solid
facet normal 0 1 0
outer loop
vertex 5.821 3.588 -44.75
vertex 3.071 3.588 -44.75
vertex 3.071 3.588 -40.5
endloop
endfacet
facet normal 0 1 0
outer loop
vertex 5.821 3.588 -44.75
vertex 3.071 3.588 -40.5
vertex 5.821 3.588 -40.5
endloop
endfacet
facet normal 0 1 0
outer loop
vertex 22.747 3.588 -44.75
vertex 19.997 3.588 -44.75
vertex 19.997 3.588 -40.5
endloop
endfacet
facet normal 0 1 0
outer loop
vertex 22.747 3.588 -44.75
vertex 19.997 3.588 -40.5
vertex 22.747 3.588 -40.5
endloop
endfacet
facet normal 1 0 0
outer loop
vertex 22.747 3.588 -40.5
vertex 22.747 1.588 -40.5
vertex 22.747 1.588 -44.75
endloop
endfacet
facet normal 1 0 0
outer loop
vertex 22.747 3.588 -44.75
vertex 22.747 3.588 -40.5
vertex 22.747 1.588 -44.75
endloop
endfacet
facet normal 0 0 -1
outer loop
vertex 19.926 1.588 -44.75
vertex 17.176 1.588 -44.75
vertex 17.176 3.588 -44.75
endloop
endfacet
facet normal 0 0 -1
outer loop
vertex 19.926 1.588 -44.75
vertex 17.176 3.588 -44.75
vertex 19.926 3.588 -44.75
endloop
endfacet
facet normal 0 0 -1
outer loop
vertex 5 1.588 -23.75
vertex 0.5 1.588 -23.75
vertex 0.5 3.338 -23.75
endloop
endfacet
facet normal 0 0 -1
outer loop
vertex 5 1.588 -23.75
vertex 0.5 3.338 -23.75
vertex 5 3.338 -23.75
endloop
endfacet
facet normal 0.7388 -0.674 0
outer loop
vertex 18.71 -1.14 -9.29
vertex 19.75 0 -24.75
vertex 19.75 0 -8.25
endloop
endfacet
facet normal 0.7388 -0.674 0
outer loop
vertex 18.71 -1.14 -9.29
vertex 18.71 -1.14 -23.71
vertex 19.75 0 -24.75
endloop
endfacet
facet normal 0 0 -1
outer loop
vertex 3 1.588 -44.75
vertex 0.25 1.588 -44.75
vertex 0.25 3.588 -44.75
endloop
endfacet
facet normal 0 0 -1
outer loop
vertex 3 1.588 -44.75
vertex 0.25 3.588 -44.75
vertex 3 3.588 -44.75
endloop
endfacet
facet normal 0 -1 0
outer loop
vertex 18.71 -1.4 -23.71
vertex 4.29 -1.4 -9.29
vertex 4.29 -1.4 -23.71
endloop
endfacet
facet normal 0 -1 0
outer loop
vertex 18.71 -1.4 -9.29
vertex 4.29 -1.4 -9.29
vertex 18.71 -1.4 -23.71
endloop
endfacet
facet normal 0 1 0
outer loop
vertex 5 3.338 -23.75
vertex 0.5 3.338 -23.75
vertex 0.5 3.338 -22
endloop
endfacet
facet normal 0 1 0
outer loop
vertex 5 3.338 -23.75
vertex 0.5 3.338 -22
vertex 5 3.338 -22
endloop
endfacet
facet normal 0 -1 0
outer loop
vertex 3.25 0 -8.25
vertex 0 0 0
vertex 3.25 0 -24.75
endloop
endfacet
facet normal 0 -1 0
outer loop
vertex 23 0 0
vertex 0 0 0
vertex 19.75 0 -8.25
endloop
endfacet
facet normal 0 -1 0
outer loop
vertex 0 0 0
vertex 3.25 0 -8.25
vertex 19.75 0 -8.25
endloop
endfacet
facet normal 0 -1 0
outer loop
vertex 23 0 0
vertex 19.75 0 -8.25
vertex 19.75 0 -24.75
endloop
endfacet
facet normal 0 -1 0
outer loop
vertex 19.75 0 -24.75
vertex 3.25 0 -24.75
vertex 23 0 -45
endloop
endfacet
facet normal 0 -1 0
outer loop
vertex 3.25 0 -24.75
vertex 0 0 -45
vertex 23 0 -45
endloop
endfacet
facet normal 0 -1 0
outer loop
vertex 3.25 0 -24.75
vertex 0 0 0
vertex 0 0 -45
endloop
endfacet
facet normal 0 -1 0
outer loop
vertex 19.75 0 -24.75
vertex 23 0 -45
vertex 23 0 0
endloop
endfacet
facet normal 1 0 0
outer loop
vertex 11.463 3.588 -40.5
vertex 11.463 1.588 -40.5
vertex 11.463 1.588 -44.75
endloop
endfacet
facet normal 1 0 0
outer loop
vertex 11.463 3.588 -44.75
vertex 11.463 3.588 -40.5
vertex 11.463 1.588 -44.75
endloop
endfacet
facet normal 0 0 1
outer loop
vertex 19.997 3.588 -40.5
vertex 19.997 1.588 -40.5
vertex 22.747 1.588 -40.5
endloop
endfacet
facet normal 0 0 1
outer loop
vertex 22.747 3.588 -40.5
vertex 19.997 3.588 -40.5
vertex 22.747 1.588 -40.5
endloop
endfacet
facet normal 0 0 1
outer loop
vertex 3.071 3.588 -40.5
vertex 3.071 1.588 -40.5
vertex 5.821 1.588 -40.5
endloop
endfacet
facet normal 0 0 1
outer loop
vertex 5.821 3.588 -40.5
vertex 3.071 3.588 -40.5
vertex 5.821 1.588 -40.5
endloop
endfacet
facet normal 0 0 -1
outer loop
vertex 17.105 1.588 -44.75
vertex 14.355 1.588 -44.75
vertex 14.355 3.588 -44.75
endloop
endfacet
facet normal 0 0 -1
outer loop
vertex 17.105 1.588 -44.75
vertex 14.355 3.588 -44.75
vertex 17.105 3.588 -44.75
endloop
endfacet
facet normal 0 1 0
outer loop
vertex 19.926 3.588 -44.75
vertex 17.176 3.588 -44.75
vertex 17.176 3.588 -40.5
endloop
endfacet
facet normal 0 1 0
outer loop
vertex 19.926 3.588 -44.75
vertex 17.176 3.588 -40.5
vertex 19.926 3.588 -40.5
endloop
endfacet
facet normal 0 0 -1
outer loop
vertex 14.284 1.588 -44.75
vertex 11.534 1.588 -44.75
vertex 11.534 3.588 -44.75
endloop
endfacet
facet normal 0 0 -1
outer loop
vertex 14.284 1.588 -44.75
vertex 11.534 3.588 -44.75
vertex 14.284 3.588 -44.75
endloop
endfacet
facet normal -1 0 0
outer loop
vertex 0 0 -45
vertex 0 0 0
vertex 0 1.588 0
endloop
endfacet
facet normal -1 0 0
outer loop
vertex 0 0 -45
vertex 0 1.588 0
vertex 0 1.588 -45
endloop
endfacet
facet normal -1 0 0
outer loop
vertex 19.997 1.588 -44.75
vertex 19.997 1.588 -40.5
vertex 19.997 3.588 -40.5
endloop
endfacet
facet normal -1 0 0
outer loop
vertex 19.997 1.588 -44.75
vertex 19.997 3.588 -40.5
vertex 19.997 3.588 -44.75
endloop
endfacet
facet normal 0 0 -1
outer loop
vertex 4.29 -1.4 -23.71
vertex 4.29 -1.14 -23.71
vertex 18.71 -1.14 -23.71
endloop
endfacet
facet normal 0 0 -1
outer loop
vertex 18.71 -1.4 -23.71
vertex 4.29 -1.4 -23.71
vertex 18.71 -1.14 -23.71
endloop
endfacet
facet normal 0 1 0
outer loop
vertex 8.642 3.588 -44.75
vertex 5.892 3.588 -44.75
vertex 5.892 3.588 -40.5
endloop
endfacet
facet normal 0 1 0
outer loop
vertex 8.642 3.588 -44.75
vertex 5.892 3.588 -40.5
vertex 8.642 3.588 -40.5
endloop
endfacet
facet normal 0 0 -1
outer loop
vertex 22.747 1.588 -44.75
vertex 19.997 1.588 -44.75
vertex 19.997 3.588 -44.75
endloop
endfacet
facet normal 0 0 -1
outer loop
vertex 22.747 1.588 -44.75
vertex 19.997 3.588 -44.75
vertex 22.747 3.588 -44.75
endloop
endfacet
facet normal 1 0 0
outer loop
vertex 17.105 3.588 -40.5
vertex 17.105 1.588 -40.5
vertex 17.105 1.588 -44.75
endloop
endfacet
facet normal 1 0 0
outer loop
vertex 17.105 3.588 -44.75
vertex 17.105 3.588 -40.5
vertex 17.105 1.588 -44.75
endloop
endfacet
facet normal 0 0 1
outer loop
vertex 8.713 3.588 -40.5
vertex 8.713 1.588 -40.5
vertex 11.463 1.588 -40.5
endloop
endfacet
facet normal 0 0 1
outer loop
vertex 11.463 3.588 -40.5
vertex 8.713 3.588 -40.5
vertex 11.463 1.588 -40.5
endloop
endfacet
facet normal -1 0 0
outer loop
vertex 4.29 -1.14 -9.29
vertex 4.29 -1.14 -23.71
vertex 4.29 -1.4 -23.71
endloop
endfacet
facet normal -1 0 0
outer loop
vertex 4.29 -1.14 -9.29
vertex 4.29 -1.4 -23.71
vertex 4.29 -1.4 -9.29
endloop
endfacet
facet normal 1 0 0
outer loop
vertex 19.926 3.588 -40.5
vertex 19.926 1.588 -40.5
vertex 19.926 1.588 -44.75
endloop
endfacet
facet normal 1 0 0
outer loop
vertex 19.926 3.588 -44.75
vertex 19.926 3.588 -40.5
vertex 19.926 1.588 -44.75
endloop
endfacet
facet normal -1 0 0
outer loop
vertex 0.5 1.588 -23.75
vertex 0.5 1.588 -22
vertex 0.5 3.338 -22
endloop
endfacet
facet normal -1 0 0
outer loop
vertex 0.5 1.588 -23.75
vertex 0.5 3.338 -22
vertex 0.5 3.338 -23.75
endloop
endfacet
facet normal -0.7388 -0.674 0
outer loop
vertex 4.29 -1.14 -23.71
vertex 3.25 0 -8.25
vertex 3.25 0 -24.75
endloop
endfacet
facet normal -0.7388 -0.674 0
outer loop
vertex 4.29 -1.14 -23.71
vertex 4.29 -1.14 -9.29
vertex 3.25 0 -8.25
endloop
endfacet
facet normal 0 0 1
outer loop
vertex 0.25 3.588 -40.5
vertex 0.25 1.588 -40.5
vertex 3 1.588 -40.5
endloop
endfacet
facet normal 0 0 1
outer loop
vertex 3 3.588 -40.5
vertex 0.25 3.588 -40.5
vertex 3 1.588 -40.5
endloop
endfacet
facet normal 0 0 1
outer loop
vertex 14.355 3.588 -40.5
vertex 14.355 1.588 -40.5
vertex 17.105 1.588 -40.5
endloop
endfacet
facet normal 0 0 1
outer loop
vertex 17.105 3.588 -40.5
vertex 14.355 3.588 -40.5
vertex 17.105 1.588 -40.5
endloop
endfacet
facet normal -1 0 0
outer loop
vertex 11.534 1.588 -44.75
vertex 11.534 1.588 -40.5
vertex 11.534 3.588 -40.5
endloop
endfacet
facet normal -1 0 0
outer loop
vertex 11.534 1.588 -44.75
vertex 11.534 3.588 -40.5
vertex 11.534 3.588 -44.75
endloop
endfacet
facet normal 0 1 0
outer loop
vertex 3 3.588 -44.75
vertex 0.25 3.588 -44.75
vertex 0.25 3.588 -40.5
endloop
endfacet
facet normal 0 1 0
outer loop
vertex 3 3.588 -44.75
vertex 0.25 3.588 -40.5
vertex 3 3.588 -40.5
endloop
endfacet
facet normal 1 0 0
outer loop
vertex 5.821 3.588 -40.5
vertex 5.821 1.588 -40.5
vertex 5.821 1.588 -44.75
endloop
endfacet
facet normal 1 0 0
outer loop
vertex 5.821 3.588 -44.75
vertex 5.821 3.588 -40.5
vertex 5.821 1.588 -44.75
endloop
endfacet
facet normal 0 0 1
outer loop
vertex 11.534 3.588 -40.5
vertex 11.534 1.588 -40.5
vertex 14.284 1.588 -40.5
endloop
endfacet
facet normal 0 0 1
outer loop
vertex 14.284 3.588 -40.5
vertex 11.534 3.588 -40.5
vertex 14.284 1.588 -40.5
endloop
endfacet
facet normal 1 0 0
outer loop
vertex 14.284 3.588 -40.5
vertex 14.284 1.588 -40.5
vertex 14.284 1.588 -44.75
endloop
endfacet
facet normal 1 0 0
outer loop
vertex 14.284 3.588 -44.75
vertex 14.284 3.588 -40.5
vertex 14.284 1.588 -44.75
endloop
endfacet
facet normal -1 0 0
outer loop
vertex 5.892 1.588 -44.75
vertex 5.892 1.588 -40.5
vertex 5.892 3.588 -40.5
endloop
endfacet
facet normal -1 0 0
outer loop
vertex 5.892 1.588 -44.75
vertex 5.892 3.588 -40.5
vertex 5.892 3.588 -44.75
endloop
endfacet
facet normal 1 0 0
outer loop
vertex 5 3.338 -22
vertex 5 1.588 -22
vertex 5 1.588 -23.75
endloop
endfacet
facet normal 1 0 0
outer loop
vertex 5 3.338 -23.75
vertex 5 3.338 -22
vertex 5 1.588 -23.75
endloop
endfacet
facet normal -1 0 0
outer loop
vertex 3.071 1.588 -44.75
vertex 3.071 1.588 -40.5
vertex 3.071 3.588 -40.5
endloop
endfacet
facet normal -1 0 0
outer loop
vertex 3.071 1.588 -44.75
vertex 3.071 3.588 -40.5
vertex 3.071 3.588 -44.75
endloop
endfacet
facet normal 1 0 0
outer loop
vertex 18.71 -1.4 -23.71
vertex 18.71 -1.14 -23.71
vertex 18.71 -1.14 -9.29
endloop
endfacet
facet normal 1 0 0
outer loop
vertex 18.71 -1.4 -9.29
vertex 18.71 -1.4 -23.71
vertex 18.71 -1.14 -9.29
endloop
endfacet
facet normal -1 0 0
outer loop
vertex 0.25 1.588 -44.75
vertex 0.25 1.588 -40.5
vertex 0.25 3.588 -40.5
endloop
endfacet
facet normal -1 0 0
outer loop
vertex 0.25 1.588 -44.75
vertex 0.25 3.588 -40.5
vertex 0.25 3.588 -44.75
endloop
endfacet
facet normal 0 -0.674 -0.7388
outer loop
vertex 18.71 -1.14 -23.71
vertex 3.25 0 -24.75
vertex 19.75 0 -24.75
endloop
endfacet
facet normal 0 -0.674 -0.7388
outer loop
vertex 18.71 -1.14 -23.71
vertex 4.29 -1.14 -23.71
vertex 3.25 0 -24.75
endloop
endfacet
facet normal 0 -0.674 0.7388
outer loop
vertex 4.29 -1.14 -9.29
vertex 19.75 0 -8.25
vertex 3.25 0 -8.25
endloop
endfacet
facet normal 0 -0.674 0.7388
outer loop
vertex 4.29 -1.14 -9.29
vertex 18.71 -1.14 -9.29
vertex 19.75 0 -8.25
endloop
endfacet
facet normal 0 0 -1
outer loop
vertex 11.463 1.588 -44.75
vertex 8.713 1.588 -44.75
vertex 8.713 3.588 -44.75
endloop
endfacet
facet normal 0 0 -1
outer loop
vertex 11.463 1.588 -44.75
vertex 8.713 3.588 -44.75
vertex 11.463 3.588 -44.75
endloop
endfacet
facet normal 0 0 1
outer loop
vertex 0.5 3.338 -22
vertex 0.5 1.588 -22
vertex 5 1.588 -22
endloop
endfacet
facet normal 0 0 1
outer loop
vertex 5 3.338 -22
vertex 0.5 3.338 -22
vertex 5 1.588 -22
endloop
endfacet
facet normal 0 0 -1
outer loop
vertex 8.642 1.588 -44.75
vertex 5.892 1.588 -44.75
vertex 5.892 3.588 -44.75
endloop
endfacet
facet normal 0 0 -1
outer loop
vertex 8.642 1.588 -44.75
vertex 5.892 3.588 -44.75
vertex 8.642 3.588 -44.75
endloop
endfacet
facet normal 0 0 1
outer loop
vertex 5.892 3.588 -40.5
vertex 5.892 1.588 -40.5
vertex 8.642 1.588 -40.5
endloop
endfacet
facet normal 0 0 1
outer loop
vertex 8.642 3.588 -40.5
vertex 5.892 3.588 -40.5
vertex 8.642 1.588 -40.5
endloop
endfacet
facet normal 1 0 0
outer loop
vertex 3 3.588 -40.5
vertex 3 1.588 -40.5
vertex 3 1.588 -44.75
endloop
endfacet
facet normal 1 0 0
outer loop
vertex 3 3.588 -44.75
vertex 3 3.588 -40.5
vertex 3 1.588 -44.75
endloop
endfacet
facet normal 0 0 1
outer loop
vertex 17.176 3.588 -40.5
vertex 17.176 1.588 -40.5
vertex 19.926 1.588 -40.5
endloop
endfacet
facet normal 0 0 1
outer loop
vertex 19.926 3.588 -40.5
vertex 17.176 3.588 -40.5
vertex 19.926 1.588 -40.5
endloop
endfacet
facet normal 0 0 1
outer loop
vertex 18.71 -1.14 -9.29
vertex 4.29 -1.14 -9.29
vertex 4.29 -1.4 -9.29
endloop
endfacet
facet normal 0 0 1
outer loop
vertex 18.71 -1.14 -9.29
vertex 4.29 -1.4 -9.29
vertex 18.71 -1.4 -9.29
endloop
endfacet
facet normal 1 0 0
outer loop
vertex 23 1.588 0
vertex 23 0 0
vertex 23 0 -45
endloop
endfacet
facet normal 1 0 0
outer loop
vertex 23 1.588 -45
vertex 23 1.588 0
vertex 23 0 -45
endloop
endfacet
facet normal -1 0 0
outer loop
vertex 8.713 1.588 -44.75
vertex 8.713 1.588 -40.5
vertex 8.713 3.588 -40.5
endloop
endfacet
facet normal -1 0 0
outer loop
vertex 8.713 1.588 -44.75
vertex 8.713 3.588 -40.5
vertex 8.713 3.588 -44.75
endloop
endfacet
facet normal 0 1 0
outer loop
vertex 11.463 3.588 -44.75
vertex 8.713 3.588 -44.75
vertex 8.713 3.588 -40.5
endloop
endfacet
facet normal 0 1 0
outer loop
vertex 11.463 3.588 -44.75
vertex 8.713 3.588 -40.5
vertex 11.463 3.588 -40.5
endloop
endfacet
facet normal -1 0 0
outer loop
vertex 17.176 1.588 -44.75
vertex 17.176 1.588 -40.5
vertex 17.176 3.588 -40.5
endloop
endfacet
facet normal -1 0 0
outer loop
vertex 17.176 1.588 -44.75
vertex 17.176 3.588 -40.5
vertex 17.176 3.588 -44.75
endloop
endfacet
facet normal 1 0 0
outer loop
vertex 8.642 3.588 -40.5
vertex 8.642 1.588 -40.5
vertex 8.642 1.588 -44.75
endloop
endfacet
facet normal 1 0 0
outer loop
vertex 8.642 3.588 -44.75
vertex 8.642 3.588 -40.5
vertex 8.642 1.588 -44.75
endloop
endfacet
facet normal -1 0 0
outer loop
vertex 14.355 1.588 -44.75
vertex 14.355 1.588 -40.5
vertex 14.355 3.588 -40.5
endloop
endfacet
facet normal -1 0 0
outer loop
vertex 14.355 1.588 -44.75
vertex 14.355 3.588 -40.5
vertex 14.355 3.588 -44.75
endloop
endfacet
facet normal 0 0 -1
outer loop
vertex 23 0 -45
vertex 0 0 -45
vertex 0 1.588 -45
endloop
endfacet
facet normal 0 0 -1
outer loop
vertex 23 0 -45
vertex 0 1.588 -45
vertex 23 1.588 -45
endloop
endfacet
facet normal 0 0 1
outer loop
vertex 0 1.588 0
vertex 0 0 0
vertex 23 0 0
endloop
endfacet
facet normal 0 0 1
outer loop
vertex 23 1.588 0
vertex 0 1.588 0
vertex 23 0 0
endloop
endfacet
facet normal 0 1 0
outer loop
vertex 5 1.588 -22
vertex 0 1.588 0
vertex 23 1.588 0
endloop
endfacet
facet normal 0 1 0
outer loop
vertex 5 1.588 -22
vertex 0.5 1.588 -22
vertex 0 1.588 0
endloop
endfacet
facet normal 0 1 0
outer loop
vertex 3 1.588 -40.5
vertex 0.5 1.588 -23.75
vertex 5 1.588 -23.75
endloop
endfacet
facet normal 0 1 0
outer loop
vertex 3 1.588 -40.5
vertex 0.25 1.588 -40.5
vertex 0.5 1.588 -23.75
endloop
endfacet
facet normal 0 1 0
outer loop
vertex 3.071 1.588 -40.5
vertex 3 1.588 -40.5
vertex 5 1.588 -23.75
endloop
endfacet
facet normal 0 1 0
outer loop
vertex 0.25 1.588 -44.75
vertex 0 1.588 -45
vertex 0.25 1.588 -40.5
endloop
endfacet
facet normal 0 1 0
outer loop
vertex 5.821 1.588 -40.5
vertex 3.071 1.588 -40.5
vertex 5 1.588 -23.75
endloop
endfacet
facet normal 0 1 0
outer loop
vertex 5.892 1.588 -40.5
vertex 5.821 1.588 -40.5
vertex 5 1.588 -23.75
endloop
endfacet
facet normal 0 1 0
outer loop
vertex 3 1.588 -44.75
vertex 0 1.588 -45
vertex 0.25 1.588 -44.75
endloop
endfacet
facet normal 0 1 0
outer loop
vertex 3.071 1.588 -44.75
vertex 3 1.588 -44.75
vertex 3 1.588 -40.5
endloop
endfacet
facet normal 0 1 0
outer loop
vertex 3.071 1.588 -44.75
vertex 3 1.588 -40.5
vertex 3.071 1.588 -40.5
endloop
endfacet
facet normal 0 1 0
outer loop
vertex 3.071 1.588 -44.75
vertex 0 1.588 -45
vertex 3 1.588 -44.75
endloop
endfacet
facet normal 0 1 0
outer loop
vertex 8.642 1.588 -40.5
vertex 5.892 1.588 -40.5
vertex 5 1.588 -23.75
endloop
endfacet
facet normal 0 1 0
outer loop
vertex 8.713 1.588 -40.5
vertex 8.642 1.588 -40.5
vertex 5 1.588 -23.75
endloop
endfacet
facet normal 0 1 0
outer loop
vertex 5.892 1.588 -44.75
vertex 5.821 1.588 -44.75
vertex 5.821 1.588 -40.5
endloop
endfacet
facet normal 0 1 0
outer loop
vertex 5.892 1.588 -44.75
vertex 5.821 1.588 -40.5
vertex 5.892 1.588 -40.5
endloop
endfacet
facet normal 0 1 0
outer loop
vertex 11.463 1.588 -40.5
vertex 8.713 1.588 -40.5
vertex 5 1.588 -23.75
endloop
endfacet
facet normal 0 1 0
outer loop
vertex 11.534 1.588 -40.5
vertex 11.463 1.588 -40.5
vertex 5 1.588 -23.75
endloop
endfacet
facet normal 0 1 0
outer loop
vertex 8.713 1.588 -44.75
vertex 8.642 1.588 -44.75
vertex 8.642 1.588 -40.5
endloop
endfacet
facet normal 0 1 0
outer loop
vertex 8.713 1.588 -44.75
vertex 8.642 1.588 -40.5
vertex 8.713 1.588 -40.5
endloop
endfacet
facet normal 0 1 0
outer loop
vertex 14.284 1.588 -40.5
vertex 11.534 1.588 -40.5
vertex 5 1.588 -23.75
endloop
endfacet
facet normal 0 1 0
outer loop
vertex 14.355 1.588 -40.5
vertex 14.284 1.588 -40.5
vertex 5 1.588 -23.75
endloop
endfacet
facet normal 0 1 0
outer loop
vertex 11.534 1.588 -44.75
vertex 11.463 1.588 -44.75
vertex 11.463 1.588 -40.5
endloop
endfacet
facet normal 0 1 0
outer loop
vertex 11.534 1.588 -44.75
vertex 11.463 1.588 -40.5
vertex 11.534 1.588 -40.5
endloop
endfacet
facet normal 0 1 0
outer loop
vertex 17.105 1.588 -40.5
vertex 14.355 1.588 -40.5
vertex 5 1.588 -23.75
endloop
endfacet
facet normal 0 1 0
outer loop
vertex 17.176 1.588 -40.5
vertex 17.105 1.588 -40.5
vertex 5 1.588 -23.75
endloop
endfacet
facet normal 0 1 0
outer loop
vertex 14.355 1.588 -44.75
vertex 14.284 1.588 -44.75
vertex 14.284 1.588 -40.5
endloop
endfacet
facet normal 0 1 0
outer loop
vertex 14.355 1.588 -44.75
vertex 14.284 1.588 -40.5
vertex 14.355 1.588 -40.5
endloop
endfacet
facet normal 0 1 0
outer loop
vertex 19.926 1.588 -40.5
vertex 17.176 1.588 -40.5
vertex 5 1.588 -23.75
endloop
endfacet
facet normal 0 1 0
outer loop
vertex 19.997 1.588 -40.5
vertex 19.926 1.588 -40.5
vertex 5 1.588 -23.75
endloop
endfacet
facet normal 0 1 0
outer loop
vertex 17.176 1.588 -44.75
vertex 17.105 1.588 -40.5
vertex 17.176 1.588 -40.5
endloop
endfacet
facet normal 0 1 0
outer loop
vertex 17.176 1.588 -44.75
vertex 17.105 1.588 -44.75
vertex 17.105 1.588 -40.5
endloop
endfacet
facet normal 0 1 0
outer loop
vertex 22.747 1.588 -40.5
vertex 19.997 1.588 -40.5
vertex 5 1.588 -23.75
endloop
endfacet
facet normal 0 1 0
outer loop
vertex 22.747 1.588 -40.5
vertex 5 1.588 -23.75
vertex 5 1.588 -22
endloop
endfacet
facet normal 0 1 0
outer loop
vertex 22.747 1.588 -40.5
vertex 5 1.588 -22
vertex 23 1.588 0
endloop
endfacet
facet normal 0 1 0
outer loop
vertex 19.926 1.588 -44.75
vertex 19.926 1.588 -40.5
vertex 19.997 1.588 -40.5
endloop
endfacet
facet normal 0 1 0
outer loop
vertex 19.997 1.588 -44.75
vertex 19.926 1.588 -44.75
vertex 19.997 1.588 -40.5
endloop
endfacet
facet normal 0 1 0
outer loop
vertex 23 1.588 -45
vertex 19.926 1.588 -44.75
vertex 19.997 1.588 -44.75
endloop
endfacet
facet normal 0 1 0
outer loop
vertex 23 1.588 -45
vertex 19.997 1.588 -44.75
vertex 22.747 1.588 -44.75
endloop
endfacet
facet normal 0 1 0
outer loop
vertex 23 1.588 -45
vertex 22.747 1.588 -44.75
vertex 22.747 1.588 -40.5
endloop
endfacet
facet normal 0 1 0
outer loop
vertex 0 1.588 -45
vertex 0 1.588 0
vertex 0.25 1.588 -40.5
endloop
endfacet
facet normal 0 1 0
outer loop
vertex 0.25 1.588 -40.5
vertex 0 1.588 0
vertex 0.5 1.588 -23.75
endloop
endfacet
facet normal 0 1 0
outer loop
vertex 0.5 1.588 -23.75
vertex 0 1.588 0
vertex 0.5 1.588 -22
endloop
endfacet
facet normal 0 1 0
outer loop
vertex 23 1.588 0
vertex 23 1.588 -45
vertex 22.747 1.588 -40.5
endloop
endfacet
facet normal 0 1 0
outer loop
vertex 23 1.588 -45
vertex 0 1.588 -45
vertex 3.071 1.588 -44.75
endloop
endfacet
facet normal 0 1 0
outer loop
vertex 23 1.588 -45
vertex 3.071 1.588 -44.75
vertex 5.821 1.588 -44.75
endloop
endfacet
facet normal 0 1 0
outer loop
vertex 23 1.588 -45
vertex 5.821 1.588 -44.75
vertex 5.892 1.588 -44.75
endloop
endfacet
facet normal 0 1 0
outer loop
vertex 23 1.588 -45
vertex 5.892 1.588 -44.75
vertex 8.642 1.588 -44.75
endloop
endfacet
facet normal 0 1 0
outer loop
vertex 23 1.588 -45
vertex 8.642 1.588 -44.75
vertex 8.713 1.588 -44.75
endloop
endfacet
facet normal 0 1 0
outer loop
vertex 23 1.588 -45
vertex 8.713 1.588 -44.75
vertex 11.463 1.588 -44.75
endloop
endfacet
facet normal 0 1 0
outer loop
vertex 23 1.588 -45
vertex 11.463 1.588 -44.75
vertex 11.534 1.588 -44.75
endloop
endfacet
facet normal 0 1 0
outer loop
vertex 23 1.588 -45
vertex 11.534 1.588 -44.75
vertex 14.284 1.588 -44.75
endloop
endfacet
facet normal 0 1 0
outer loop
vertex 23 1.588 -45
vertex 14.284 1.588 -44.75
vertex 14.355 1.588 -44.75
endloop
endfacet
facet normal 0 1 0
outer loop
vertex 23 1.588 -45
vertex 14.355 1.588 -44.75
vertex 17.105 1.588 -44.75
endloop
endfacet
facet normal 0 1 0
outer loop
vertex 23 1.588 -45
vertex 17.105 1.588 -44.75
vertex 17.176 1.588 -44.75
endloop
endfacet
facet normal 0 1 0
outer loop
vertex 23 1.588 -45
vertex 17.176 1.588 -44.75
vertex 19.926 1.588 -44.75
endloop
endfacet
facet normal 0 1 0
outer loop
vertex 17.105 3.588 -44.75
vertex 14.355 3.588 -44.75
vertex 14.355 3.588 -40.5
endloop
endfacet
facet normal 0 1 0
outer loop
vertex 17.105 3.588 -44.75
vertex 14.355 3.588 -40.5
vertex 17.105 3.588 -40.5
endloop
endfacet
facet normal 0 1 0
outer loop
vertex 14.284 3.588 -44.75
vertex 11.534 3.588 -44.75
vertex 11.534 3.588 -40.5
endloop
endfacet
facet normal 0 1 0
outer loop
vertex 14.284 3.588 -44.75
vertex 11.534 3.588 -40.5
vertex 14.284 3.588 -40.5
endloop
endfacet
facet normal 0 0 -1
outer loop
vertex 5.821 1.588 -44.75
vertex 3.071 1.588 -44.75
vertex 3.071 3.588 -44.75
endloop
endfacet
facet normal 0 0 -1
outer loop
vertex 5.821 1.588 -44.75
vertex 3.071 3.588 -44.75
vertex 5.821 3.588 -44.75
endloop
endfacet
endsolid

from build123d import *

# Parameters (mm, degrees)
SKETCH1_W           = 23
SKETCH1_H           = 45
BOSS_EXTRUDE1_DEPTH = 1.5875
SKETCH2_W           = 16.5
SKETCH2_H           = 16.5
BOSS_EXTRUDE2_DEPTH = 1.14
BOSS_EXTRUDE2_TAPER = 42.37
SKETCH3_W           = 14.42
SKETCH3_H           = 14.42
BOSS_EXTRUDE3_DEPTH = 0.26
SKETCH4_W           = 2.75
SKETCH4_H           = 4.25
BOSS_EXTRUDE4_DEPTH = 2
SKETCH5_W           = 4.5
SKETCH5_H           = 1.75
BOSS_EXTRUDE5_DEPTH = 1.75


with BuildPart() as part:
    # Sketch1 → Boss-Extrude1 (new body)
    with BuildSketch(Plane(origin=(0, 0, 0), x_dir=(1, 0, 0), z_dir=(0, 1, 0))):
        with Locations((11.5, 22.5)):
            Rectangle(SKETCH1_W, SKETCH1_H)
    extrude(amount=BOSS_EXTRUDE1_DEPTH)

    # Sketch2 → Boss-Extrude2 (add)
    with BuildSketch(Plane.XZ):
        with Locations((11.5, -16.5)):
            Rectangle(SKETCH2_W, SKETCH2_H)
    extrude(amount=BOSS_EXTRUDE2_DEPTH, taper=BOSS_EXTRUDE2_TAPER)

    # Sketch3 → Boss-Extrude3 (add)
    with BuildSketch(Plane.XZ.offset(1.14)):
        with Locations((11.5, -16.5)):
            Rectangle(SKETCH3_W, SKETCH3_H)
    extrude(amount=BOSS_EXTRUDE3_DEPTH)

    # Sketch4 → Boss-Extrude4 (add)
    with BuildSketch(Plane(origin=(0, 1.5875, 0), x_dir=(1, 0, 0), z_dir=(0, 1, 0))):
        with Locations((4.446, 42.625)):
            Rectangle(SKETCH4_W, SKETCH4_H)
        with Locations((1.625, 42.625)):
            Rectangle(SKETCH4_W, SKETCH4_H)
        with Locations((7.267, 42.625)):
            Rectangle(SKETCH4_W, SKETCH4_H)
        with Locations((10.088, 42.625)):
            Rectangle(SKETCH4_W, SKETCH4_H)
        with Locations((12.909, 42.625)):
            Rectangle(SKETCH4_W, SKETCH4_H)
        with Locations((15.73, 42.625)):
            Rectangle(SKETCH4_W, SKETCH4_H)
        with Locations((18.551, 42.625)):
            Rectangle(SKETCH4_W, SKETCH4_H)
        with Locations((21.372, 42.625)):
            Rectangle(SKETCH4_W, SKETCH4_H)
    extrude(amount=BOSS_EXTRUDE4_DEPTH)

    # Sketch5 → Boss-Extrude5 (add)
    with BuildSketch(Plane(origin=(0, 1.5875, 0), x_dir=(1, 0, 0), z_dir=(0, 1, 0))):
        with Locations((2.75, 22.875)):
            Rectangle(SKETCH5_W, SKETCH5_H)
    extrude(amount=BOSS_EXTRUDE5_DEPTH)


solid = part.part
